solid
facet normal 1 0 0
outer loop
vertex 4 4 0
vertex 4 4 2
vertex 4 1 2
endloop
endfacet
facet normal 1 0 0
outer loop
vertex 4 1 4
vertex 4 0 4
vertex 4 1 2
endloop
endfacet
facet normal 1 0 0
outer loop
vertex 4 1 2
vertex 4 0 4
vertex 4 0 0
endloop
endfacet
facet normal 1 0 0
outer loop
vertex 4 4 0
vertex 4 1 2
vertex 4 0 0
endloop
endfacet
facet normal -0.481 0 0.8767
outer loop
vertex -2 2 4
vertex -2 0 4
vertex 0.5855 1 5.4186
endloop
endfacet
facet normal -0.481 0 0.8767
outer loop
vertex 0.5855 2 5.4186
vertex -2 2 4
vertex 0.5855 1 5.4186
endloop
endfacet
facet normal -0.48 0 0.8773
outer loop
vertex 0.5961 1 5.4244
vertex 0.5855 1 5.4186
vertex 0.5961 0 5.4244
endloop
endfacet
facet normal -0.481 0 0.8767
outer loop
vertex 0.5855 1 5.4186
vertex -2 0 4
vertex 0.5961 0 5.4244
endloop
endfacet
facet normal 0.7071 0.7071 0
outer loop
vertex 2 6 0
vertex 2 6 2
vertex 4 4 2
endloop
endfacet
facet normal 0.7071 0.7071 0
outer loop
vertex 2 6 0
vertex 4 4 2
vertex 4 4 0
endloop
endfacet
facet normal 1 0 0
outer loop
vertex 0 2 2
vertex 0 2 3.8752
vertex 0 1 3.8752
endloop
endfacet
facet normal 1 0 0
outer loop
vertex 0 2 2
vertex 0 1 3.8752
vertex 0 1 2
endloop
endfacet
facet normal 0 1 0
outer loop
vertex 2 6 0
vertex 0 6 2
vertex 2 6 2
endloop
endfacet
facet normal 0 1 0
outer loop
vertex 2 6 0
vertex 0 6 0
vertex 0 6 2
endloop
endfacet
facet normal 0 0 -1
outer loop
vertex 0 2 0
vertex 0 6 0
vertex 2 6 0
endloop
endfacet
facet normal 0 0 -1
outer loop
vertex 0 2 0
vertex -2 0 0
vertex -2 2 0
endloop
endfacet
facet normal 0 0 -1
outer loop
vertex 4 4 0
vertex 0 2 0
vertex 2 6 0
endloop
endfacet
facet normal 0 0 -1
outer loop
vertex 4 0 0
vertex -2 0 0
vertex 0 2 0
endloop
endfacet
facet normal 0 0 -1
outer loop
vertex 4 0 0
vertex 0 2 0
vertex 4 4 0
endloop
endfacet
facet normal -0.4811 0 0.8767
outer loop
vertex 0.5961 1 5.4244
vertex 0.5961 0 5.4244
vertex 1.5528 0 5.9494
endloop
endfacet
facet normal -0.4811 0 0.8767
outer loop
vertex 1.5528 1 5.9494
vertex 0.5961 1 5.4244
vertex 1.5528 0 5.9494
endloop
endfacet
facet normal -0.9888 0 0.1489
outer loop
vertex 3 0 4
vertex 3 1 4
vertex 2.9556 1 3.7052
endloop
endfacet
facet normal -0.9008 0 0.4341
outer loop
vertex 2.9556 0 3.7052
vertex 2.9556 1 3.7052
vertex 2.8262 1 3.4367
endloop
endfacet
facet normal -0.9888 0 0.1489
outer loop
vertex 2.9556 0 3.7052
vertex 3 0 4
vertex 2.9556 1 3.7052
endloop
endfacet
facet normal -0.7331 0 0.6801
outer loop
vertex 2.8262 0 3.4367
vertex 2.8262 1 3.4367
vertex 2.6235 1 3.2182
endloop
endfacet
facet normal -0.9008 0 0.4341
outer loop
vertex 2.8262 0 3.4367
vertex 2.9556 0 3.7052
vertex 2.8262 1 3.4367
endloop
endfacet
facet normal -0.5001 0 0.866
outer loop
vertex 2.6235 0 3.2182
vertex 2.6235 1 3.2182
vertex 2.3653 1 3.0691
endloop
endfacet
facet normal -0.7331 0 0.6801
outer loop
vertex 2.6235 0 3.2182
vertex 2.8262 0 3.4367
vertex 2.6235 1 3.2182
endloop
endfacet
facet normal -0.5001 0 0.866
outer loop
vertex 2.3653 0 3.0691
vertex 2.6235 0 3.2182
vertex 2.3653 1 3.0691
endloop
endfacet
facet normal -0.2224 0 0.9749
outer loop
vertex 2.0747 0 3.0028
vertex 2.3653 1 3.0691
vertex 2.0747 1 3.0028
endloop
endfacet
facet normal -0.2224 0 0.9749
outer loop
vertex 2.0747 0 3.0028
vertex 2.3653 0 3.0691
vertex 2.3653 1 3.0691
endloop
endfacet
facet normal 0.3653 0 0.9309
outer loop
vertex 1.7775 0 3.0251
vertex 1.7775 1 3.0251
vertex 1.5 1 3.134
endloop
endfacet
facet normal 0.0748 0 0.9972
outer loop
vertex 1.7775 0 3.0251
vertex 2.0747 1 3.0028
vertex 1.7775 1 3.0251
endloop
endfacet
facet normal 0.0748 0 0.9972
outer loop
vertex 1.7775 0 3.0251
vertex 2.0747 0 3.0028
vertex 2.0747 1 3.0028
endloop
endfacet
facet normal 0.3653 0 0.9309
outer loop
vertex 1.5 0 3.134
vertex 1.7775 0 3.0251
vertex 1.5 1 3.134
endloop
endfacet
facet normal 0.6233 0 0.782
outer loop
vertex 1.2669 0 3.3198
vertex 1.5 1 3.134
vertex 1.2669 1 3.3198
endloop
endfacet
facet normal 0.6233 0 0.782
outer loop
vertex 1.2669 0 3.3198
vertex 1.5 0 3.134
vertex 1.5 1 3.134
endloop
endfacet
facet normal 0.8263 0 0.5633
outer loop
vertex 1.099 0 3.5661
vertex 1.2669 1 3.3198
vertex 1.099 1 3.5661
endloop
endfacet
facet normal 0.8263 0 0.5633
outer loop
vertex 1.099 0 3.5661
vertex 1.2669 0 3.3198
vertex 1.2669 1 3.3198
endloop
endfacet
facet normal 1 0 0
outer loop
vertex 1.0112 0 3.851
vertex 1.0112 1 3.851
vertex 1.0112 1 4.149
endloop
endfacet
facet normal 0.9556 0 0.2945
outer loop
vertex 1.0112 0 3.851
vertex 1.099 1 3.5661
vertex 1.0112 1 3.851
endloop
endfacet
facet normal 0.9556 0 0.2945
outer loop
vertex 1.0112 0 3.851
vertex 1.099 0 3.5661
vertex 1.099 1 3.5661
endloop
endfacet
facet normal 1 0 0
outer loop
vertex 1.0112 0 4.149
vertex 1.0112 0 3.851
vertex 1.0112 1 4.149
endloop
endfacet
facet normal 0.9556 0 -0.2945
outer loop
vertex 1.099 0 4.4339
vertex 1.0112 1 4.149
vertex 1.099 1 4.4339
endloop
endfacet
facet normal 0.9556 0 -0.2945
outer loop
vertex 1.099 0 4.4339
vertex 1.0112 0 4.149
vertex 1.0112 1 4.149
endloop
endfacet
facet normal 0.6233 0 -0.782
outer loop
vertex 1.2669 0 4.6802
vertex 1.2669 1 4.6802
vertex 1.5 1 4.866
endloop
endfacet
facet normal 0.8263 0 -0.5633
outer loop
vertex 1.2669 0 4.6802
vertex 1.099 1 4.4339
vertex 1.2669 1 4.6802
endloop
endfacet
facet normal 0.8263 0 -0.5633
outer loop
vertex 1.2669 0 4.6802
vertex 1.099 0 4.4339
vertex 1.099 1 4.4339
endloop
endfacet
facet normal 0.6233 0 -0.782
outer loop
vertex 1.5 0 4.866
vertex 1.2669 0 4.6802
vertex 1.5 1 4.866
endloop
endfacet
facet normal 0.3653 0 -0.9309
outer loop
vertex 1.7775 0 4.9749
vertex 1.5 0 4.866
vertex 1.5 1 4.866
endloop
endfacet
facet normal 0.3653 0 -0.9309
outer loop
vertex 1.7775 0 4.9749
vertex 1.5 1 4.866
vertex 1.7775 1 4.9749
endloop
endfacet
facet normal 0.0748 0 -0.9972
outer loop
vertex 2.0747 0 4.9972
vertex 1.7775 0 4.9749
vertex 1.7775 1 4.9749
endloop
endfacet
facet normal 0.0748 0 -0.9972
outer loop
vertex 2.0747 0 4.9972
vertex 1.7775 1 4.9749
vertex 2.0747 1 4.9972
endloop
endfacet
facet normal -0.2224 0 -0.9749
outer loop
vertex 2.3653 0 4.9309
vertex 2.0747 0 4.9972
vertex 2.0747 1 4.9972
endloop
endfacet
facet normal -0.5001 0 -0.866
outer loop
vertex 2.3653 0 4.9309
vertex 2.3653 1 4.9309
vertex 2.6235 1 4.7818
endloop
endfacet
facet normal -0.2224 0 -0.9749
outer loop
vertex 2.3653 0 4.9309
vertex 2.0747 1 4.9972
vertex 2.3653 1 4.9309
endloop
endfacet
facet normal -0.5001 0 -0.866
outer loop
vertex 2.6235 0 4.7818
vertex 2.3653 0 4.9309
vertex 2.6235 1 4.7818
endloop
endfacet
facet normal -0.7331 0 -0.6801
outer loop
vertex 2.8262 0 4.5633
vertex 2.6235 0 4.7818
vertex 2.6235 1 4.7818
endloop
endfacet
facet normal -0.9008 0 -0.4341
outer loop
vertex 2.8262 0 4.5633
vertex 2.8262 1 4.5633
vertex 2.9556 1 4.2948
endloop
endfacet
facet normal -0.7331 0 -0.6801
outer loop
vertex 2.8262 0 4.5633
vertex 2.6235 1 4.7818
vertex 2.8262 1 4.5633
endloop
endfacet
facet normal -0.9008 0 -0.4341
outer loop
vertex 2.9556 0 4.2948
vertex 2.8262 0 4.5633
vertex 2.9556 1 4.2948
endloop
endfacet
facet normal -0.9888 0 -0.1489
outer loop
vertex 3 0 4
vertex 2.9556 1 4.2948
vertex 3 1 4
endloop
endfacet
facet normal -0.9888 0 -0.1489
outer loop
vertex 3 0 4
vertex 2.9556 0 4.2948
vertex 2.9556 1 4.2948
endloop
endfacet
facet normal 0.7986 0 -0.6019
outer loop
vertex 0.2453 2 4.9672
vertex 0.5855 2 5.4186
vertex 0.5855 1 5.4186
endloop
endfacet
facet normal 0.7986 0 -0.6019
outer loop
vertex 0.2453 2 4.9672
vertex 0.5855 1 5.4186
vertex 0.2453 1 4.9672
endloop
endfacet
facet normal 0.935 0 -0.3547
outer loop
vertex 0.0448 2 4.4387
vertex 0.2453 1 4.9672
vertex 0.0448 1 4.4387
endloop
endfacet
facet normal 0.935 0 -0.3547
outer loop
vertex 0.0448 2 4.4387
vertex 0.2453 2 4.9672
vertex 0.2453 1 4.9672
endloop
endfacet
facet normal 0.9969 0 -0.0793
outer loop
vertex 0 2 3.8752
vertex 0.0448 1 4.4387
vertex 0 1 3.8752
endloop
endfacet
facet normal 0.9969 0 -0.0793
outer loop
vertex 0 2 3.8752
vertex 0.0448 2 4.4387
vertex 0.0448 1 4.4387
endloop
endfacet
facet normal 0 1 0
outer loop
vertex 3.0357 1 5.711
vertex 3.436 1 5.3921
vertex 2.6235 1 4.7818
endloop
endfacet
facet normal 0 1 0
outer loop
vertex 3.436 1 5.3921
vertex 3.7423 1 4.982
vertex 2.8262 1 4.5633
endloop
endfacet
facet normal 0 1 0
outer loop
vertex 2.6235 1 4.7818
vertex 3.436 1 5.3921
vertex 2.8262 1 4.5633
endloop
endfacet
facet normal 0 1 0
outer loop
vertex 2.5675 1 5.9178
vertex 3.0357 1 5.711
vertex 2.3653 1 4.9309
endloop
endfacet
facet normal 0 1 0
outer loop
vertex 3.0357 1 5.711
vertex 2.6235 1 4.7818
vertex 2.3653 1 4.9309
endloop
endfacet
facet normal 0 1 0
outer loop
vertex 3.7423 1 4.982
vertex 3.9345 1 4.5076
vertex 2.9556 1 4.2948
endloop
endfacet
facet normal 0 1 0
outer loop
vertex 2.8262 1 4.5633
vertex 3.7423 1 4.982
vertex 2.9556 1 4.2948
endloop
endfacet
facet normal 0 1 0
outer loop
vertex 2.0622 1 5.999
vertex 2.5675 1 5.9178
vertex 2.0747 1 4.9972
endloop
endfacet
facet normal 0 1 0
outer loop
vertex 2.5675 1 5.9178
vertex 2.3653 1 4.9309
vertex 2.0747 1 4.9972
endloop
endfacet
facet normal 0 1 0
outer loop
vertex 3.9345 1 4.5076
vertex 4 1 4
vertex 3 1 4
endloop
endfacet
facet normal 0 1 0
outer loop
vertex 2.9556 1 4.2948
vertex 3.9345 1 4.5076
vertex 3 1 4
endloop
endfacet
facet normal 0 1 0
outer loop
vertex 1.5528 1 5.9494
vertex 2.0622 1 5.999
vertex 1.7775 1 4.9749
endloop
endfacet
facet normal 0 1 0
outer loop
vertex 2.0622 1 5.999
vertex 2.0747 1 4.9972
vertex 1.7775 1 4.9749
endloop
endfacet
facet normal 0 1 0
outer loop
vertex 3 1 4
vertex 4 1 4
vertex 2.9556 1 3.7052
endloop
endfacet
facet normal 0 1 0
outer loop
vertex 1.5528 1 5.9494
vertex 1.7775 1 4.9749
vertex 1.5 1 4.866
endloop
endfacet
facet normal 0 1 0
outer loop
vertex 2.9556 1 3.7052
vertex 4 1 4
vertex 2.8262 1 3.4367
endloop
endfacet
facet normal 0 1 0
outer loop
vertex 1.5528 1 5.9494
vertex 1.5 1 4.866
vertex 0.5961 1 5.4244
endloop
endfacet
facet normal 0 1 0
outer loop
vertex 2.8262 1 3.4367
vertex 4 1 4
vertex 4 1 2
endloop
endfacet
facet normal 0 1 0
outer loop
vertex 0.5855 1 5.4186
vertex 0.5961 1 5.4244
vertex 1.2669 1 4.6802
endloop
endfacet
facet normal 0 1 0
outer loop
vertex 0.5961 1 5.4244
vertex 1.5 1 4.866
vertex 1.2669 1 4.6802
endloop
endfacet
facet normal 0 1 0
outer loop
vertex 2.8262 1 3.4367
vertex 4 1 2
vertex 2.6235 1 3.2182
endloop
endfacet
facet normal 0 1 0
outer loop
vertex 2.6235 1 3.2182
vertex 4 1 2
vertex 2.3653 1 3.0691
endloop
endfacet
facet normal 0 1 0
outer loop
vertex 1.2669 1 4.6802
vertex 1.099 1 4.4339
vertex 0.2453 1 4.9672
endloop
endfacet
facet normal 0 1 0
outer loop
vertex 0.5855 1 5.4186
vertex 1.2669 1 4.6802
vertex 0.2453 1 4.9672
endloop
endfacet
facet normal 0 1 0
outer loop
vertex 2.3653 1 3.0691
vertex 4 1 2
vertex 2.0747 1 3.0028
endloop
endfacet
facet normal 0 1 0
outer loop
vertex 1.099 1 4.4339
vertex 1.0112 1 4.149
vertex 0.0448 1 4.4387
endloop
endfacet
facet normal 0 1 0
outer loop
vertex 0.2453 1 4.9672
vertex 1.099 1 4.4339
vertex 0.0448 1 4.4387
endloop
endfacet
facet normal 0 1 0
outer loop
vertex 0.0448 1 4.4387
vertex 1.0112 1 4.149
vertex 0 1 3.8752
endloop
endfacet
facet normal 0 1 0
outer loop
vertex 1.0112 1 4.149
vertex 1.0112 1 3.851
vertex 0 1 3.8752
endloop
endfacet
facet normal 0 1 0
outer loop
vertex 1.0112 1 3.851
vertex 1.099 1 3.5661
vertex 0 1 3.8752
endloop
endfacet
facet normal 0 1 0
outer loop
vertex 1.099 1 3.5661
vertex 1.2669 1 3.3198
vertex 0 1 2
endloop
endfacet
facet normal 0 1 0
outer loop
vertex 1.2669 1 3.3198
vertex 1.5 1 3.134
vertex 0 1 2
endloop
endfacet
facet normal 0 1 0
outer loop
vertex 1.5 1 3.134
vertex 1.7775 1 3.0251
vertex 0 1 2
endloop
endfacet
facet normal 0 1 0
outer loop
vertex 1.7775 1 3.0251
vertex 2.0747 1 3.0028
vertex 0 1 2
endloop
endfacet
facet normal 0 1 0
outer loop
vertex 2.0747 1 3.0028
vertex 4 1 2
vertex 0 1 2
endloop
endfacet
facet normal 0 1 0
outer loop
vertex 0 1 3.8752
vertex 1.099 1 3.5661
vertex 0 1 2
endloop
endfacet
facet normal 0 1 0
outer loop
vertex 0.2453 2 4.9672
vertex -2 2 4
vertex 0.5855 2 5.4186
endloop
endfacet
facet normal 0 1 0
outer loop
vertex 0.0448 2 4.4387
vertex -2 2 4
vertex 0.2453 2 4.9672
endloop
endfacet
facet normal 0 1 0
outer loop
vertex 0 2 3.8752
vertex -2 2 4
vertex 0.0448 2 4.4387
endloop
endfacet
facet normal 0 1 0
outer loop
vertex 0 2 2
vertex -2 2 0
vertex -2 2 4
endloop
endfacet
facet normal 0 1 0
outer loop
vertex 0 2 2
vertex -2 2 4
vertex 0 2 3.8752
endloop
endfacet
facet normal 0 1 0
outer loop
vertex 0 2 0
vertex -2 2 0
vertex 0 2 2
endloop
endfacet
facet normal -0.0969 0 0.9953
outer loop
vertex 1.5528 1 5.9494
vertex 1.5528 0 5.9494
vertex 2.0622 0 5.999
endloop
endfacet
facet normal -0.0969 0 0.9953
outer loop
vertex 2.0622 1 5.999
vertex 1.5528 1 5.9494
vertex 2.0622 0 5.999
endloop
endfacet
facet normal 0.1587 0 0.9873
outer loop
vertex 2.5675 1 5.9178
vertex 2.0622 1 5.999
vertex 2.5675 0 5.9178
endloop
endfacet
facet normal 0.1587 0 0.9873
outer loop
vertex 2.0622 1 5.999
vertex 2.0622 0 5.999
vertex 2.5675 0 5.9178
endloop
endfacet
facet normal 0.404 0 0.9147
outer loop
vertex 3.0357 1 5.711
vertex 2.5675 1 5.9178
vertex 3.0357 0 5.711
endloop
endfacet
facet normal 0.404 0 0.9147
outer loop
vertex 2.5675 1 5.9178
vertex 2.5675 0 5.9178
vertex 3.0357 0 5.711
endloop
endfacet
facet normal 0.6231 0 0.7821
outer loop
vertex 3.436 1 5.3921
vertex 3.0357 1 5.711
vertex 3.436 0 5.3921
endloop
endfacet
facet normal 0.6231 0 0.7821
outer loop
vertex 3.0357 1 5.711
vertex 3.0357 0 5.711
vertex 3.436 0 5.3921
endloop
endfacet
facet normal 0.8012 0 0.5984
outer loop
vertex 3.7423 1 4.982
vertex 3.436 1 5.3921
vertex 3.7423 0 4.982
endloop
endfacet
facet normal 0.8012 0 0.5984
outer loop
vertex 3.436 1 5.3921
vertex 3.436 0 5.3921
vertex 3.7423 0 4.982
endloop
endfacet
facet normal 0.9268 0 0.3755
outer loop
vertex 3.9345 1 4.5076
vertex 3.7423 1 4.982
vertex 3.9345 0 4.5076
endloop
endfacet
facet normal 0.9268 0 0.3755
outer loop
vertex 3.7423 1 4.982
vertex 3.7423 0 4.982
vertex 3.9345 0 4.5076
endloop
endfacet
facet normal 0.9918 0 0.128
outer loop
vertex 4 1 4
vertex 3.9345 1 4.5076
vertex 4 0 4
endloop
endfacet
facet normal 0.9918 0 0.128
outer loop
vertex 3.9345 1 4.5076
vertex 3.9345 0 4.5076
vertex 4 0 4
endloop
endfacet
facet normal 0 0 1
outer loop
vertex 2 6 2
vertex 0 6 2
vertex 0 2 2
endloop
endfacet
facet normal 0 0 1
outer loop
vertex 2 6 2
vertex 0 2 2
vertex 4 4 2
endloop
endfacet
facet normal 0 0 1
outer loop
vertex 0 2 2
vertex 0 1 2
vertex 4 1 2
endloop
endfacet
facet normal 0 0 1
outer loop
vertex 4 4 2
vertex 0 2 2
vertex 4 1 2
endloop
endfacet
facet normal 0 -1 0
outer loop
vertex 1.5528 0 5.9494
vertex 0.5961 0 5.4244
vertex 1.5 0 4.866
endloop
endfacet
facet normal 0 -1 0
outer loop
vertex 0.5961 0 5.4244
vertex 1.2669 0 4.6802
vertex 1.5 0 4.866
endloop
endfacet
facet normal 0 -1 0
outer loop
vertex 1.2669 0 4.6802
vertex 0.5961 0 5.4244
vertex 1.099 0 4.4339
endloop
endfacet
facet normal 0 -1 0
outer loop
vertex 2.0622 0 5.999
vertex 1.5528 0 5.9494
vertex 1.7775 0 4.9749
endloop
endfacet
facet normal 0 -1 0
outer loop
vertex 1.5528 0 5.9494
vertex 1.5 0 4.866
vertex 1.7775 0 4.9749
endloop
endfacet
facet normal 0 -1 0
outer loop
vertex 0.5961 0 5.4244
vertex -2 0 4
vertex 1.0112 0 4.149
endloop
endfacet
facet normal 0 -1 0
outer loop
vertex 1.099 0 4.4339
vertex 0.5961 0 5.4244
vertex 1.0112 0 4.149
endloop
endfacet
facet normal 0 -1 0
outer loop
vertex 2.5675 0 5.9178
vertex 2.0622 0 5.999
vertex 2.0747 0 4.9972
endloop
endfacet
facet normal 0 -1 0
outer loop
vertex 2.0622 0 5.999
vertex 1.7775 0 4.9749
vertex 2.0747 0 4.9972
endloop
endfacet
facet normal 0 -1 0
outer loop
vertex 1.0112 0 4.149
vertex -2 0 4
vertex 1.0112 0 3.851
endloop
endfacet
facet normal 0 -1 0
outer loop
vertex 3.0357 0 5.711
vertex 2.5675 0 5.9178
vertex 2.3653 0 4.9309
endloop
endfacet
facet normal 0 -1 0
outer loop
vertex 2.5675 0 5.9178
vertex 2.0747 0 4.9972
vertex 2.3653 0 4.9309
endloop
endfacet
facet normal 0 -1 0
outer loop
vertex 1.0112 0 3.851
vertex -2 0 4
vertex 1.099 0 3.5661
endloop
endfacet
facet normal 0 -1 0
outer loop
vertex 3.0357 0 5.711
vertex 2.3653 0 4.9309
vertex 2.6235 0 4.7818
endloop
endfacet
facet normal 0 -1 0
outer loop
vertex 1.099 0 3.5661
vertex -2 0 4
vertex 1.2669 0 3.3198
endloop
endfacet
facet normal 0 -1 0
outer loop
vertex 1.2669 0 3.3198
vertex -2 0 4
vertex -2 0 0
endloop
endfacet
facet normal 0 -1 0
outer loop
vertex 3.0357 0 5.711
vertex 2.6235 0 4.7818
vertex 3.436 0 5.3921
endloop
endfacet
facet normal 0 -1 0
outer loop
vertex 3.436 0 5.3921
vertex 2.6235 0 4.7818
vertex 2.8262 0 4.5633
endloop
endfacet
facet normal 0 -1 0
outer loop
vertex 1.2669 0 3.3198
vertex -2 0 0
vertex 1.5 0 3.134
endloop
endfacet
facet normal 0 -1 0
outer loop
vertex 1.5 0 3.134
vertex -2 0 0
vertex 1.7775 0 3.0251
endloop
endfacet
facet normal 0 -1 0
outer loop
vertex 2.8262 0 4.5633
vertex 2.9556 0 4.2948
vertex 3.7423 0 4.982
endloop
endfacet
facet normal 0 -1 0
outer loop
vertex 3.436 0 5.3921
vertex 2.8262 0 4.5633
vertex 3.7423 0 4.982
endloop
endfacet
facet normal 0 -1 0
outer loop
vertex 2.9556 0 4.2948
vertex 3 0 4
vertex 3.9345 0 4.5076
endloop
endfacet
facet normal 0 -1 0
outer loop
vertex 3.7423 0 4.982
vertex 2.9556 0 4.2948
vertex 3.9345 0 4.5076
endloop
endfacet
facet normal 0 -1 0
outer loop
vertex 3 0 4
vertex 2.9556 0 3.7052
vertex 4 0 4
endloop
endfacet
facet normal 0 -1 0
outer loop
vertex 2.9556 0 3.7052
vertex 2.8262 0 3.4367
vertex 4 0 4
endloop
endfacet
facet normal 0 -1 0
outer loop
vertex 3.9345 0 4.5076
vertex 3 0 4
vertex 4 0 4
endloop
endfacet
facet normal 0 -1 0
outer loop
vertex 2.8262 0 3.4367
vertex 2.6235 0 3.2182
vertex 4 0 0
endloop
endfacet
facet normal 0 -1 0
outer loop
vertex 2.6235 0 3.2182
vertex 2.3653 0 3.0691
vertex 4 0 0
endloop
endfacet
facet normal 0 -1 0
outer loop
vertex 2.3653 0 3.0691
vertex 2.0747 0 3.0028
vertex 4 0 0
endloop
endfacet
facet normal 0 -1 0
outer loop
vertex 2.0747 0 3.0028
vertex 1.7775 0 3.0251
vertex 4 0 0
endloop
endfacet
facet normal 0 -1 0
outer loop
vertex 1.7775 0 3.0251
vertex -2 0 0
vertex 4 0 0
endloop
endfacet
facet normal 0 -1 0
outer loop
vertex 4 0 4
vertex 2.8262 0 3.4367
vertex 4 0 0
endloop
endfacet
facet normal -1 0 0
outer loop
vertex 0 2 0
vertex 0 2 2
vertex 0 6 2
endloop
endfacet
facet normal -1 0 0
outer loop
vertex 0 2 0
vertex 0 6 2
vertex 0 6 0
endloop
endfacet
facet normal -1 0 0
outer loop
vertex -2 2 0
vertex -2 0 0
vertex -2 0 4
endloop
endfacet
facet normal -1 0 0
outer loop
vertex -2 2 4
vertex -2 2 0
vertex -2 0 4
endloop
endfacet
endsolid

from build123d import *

# Parameters (mm, degrees)
SKETCH1_R           = 1
BOSS_EXTRUDE1_DEPTH = 2
CUT_EXTRUDE1_DEPTH  = 1
SKETCH3_W           = 4
SKETCH3_H           = 2
BOSS_EXTRUDE2_DEPTH = 5
CHAMFER1_SIZE       = 2


with BuildPart() as part:
    # Sketch1 → Boss-Extrude1 (new body)
    with BuildSketch(Plane(origin=(0, 0, 0), x_dir=(1, 0, 0), z_dir=(0, 1, 0))):
        with BuildLine():
            Line((0, -4), (0, 0))
            Line((0, 0), (-2, 0))
            Line((-2, 0), (-2, -4))
            Line((-2, -4), (0.596081752, -5.424434468))
            ThreePointArc((0.596081752, -5.424434468), (0.15502893, -4.772063308), (0, -4))
        make_face()
        with BuildLine():
            Line((4, 0), (0, 0))
            Line((0, 0), (0, -4))
            ThreePointArc((0, -4), (0.15502893, -4.772063308), (0.596081752, -5.424434468))
            Line((0.596081752, -5.424434468), (1.552766589, -5.949354323))
            ThreePointArc((1.552766589, -5.949354323), (3.246100553, -5.56436358), (4, -4))
            Line((4, -4), (4, 0))
        make_face()
        with Locations((2, -4)):
            Circle(SKETCH1_R, mode=Mode.SUBTRACT)
    extrude(amount=BOSS_EXTRUDE1_DEPTH)

    # Sketch2 → Cut-Extrude1 (cut)
    with BuildSketch(Plane(origin=(0, 2, 0), x_dir=(1, 0, 0), z_dir=(0, 1, 0))):
        with BuildLine():
            Line((0, 0), (4, 0))
            Line((4, 0), (4, -4))
            ThreePointArc((4, -4), (1.935634166, -6.000972869), (0, -3.875221449))
            Line((0, -3.875221449), (0, 0))
        make_face()
    extrude(amount=-CUT_EXTRUDE1_DEPTH, mode=Mode.SUBTRACT)

    # Sketch3 → Boss-Extrude2 (add)
    with BuildSketch(Plane(origin=(0, 1, 0), x_dir=(1, 0, 0), z_dir=(0, 1, 0))):
        with Locations((2, -1)):
            Rectangle(SKETCH3_W, SKETCH3_H)
    extrude(amount=BOSS_EXTRUDE2_DEPTH)

    # Chamfer1
    chamfer1_edges = [part.edges().sort_by_distance(p)[0] for p in [
        (4, 6, 1),
    ]]
    chamfer(chamfer1_edges, length=CHAMFER1_SIZE)


solid = part.part
